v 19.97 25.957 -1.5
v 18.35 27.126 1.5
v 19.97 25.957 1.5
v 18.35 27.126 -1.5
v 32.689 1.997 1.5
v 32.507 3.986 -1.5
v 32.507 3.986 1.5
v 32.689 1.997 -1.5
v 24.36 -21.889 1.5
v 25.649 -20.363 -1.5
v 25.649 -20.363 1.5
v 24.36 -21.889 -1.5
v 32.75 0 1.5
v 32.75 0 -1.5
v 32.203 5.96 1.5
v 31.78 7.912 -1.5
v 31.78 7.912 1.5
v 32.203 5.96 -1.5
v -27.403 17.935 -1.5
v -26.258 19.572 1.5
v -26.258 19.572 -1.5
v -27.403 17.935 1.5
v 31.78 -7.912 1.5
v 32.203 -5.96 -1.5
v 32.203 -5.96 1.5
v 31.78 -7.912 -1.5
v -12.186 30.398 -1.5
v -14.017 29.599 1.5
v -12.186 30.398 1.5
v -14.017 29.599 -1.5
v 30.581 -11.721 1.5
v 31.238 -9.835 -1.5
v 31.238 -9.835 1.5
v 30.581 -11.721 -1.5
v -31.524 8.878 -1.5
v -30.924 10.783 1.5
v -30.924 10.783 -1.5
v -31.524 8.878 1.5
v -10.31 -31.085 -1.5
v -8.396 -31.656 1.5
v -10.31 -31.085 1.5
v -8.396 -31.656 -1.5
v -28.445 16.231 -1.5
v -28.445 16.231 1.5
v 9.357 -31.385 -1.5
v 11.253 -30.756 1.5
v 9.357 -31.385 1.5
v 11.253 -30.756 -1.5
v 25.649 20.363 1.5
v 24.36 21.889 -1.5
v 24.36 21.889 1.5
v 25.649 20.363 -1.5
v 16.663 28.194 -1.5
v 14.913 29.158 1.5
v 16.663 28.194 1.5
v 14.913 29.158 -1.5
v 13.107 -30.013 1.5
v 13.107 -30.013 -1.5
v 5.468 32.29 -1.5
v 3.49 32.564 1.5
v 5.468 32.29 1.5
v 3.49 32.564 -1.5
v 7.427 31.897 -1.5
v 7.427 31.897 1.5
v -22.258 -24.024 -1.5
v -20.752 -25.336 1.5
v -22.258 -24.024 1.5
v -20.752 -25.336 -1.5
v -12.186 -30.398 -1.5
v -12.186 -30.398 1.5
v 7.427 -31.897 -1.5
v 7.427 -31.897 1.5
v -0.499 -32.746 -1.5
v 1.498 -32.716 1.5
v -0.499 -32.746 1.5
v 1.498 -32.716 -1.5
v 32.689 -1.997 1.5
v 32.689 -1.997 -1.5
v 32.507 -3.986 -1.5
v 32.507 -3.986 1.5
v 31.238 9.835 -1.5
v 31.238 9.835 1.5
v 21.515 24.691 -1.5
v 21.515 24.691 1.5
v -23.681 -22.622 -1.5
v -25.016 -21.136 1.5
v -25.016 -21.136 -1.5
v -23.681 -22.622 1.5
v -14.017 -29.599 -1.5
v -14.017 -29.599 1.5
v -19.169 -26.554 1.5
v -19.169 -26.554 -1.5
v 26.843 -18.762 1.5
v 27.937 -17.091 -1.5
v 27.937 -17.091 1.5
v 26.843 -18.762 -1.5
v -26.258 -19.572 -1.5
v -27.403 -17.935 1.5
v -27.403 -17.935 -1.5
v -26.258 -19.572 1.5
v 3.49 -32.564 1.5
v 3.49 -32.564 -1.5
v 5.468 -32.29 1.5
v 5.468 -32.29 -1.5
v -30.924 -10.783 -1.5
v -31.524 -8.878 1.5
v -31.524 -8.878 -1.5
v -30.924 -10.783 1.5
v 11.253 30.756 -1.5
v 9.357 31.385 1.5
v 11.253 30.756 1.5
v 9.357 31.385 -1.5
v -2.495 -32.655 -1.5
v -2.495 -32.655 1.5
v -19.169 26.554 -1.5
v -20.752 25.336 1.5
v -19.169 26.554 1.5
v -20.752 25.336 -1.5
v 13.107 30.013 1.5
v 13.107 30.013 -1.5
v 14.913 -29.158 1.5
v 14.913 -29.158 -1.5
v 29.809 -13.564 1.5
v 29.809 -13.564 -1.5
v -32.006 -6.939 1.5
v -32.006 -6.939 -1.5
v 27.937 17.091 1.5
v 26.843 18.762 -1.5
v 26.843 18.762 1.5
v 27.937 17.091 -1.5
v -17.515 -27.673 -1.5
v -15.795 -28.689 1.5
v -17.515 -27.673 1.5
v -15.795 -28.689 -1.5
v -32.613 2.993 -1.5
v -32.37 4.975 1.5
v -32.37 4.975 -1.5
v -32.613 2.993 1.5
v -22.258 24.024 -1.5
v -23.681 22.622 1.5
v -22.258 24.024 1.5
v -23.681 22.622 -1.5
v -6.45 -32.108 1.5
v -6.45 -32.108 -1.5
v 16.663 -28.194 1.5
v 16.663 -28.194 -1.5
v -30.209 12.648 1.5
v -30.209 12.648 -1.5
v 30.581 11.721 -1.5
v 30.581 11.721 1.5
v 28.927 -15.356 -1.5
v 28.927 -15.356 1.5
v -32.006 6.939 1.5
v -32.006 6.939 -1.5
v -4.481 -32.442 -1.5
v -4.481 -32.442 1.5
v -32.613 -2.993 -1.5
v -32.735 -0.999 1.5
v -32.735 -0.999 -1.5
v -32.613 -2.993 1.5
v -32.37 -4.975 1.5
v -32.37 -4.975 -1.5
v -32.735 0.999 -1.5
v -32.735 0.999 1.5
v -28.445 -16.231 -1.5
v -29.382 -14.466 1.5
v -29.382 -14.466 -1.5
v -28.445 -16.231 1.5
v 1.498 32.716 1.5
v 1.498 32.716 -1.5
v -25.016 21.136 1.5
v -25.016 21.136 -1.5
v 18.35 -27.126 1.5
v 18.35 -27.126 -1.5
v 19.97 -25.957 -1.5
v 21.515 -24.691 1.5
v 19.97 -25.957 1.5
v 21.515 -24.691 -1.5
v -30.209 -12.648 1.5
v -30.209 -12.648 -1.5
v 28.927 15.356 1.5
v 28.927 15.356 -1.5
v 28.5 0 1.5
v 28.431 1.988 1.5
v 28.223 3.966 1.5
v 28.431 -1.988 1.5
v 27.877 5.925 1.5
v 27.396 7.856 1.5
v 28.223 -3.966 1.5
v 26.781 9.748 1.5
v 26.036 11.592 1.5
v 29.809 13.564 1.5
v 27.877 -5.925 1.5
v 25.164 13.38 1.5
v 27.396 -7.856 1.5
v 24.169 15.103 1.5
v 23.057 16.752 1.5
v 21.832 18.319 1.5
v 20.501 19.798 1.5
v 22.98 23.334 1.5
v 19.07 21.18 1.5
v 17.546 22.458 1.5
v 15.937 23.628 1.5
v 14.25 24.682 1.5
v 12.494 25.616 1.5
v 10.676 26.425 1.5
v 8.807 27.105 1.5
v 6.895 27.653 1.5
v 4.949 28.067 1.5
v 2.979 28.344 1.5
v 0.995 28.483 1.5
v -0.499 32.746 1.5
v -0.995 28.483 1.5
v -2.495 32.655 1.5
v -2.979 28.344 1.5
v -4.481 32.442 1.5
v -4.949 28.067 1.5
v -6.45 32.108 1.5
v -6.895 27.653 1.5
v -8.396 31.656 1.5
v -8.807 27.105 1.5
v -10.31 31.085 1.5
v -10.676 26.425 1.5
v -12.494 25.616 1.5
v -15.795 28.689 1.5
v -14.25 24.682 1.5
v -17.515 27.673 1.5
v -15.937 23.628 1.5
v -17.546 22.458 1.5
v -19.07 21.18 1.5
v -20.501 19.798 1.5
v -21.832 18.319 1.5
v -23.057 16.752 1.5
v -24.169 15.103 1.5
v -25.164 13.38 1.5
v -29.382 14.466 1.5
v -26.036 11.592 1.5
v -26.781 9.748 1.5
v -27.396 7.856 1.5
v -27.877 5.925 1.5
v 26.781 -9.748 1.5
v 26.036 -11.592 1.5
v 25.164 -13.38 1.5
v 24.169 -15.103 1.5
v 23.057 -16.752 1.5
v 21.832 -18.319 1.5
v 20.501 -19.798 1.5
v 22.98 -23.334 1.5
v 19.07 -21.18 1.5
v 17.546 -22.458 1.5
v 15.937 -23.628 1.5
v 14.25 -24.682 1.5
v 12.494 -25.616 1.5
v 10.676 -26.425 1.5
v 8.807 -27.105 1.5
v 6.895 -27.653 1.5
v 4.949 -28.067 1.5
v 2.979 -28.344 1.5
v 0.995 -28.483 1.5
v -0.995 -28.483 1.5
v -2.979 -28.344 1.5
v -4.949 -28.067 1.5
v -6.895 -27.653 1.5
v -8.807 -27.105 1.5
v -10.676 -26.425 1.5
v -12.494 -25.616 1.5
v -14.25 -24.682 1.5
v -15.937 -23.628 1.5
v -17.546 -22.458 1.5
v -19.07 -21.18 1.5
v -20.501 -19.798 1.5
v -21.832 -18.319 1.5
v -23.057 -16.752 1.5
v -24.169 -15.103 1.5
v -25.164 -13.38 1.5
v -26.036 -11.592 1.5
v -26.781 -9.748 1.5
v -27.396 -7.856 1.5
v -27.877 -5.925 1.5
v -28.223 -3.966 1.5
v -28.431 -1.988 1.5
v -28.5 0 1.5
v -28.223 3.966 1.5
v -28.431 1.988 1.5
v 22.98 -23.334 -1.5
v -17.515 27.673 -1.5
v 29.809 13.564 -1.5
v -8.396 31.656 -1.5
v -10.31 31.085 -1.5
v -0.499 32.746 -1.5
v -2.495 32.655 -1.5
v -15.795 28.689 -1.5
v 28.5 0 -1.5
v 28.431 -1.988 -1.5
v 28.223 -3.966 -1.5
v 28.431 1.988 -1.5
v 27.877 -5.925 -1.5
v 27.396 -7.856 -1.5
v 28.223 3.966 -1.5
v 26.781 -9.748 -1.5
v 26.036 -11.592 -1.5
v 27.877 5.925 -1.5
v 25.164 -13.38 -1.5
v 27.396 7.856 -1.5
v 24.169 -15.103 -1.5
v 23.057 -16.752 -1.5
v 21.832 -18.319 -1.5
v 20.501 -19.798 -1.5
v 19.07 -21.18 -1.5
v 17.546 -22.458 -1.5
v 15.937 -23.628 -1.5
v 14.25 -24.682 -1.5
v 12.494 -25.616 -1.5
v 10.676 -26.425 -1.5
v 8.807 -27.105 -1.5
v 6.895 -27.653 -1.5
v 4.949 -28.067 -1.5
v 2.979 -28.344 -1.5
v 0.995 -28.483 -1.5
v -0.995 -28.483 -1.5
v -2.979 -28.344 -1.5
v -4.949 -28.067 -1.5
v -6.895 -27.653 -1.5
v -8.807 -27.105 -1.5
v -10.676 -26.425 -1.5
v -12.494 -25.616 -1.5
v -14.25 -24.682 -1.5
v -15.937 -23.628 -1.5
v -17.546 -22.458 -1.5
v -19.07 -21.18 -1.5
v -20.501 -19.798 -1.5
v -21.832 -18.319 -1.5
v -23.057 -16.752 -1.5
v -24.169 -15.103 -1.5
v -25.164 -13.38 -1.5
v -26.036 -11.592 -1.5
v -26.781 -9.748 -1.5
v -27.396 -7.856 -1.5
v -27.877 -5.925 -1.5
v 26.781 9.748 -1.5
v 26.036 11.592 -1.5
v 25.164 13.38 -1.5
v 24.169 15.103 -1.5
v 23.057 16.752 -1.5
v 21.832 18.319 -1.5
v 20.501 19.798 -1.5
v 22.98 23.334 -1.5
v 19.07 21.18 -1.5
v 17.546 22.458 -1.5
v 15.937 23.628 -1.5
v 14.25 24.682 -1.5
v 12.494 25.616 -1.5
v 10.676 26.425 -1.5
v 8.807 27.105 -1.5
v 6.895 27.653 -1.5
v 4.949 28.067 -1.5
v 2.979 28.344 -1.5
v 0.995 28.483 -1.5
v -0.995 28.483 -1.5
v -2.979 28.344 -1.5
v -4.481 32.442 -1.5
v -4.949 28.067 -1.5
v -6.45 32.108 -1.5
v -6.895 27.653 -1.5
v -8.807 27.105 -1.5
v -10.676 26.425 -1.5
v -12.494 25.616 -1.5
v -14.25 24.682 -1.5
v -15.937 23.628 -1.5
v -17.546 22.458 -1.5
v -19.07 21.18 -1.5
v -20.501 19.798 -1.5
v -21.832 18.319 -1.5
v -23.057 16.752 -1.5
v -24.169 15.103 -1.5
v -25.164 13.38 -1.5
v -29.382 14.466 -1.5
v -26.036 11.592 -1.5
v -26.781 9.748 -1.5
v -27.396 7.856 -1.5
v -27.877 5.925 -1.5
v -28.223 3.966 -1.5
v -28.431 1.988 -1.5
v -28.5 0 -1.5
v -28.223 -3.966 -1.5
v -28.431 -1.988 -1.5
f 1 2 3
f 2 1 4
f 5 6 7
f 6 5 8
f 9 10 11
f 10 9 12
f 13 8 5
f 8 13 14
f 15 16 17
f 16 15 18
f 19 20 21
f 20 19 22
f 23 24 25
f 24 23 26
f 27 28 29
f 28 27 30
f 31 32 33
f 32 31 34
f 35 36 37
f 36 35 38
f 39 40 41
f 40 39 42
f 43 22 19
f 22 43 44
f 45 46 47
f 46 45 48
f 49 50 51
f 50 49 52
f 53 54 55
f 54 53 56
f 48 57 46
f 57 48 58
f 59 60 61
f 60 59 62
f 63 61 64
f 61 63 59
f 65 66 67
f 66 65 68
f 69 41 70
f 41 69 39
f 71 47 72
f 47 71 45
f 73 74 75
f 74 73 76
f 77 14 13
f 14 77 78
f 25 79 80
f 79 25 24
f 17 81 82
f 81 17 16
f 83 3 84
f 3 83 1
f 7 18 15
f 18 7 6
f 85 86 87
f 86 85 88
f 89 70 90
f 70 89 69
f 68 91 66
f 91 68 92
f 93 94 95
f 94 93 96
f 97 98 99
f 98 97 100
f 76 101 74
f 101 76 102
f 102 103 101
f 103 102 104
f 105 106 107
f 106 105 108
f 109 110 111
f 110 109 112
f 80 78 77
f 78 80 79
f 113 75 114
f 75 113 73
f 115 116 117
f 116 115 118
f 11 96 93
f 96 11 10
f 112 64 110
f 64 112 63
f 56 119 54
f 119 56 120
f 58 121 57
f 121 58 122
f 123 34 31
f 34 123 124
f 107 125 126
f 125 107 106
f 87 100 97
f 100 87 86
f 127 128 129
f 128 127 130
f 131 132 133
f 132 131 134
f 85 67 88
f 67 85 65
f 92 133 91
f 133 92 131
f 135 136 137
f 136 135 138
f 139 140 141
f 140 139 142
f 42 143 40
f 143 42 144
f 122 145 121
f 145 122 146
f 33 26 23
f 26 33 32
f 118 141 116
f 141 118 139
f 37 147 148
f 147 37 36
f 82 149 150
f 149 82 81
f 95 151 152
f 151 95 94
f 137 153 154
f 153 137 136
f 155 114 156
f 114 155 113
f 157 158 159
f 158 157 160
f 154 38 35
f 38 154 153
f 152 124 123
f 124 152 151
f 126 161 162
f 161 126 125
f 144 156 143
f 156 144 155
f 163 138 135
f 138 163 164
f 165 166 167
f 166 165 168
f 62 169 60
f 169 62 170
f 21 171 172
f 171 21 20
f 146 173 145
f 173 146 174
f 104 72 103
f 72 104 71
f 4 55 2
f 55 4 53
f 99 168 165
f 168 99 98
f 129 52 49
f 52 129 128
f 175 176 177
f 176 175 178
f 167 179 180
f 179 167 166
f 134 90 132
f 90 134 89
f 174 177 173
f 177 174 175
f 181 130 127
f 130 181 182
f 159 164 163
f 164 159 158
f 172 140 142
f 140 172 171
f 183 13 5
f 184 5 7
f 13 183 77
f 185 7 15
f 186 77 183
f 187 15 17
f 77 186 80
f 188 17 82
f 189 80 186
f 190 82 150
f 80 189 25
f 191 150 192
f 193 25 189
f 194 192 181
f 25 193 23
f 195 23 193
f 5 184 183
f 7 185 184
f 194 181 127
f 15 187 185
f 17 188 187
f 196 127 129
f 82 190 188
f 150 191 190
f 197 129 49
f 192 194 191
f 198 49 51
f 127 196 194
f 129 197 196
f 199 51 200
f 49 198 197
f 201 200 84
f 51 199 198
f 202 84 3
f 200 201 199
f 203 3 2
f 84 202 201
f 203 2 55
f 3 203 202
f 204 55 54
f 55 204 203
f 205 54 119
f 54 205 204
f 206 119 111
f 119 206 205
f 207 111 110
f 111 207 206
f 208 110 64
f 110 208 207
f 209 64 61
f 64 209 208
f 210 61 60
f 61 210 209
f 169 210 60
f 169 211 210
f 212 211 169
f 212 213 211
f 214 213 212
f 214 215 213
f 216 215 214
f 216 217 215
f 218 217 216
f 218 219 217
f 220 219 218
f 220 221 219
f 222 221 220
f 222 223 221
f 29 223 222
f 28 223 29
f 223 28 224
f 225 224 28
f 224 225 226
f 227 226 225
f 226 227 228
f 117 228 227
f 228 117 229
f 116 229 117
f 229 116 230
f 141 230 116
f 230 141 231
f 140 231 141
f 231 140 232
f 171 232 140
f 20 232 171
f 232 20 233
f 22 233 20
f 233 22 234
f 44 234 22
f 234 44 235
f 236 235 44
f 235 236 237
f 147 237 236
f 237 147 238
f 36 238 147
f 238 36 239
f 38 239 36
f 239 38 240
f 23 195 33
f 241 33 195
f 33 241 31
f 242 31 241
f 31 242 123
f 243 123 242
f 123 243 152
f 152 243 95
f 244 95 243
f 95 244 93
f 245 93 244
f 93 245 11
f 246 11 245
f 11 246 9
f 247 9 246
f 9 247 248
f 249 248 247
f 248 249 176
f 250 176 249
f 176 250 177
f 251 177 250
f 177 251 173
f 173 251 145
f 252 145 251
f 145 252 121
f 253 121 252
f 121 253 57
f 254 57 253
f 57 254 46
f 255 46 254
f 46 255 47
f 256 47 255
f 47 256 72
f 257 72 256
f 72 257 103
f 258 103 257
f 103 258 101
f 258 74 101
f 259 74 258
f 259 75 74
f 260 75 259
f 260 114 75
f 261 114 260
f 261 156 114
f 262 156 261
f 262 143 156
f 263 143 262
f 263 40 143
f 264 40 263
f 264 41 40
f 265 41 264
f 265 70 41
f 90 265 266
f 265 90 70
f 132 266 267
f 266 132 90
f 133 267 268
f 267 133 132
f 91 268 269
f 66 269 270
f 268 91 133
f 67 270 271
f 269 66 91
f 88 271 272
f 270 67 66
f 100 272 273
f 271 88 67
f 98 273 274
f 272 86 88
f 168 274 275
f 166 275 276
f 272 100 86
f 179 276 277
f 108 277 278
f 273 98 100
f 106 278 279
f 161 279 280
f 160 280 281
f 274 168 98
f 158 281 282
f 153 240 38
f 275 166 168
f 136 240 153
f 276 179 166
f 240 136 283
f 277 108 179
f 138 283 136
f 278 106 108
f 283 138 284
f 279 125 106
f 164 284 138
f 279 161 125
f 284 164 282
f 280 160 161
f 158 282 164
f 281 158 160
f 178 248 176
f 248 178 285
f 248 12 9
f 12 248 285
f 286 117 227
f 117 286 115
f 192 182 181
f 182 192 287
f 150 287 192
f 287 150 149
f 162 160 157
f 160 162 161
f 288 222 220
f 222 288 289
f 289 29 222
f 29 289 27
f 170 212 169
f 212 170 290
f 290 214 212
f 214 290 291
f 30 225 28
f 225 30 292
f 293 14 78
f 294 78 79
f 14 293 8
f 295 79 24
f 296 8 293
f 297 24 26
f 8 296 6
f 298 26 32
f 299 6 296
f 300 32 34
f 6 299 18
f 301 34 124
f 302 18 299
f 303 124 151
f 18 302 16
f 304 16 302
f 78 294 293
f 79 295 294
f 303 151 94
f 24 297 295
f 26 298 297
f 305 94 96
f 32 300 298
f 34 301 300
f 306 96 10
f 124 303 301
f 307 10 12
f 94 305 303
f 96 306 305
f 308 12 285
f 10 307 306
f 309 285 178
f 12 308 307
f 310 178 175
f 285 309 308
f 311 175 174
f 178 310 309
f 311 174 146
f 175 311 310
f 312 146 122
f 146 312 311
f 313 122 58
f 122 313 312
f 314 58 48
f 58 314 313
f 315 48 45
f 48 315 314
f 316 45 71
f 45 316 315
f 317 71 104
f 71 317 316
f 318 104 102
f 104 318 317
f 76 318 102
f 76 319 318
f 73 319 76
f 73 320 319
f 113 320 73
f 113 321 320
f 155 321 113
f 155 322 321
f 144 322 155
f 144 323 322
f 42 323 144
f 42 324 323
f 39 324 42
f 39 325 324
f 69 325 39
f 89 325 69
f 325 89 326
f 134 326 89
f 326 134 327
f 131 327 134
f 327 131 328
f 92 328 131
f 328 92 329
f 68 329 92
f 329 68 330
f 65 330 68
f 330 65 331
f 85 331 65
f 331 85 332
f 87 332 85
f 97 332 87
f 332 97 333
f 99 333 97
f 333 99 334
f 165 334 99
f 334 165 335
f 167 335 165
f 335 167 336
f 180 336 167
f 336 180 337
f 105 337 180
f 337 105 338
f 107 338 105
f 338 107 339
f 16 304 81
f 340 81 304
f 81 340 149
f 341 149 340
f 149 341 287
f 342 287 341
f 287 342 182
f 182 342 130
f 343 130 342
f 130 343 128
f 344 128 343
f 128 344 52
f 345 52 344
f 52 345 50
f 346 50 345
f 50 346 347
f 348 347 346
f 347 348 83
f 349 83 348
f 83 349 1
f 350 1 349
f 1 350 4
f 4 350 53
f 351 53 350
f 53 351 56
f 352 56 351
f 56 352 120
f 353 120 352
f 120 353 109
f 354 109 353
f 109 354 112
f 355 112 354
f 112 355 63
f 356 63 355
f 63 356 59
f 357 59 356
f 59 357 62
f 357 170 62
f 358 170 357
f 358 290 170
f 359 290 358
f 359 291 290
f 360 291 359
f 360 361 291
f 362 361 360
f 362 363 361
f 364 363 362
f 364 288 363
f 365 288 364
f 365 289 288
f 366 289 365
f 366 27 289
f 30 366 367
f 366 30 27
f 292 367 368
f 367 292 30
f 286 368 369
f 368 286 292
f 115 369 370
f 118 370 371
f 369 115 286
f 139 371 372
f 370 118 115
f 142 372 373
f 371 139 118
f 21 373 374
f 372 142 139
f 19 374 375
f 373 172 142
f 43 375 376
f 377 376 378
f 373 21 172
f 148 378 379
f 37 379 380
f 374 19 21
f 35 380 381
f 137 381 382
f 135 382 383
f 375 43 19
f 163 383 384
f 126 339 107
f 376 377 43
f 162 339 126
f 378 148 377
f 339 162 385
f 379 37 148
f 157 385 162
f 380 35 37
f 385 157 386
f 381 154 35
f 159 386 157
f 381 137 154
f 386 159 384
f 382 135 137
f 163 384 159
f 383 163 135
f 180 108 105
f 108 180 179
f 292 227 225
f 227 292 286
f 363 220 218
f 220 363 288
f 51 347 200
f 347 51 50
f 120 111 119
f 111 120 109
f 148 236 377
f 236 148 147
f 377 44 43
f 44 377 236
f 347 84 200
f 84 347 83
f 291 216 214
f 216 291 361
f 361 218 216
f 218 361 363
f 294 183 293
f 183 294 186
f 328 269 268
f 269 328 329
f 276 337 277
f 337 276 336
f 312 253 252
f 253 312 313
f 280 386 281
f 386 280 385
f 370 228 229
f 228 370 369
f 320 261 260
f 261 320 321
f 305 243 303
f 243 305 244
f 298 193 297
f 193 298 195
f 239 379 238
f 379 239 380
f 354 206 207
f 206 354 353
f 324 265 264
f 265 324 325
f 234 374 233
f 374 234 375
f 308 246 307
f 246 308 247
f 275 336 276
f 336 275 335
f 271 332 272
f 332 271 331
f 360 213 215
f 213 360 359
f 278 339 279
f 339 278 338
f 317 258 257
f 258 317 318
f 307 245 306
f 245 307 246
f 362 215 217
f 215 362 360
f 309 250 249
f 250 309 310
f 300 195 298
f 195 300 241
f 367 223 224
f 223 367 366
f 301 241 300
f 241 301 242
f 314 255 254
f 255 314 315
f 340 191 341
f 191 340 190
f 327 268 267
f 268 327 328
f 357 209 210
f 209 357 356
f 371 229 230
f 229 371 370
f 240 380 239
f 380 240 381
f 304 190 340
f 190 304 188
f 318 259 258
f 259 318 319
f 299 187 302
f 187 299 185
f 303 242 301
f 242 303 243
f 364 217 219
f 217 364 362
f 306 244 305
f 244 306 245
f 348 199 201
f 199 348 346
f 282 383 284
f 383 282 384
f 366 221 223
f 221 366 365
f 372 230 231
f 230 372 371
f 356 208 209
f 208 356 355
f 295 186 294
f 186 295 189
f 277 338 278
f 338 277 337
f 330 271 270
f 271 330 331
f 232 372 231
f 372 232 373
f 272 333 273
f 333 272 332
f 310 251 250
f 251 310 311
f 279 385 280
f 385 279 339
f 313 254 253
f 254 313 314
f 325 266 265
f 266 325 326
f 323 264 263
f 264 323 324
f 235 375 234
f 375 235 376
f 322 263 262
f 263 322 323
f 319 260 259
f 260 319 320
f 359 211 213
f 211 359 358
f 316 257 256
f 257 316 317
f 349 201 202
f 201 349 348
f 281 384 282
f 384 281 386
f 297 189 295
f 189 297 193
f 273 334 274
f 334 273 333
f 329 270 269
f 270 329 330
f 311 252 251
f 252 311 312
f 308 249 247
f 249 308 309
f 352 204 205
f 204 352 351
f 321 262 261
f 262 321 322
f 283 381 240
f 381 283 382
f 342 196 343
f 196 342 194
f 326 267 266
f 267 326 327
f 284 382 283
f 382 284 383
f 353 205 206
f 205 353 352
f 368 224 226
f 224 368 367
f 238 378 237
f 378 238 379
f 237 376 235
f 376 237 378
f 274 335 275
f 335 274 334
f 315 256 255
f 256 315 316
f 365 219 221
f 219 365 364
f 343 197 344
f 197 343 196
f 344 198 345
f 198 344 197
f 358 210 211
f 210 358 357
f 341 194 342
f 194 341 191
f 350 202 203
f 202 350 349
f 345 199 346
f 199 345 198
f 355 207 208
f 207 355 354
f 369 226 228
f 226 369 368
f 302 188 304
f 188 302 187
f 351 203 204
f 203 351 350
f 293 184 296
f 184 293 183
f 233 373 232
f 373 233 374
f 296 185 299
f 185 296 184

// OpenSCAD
DIA_OUTER_RING =  65.5;
DIA_INNER_RING = DIA_OUTER_RING -2*4.25;
HEIGHT_RING = 3.0;

difference(){
	linear_extrude(height = HEIGHT_RING, center = true){
		circle(d=DIA_OUTER_RING, $fa = 0.01);
	}

	linear_extrude(height = 4*HEIGHT_RING, center = true){
		circle(d=DIA_INNER_RING, , $fa = 0.01);
	}
}
